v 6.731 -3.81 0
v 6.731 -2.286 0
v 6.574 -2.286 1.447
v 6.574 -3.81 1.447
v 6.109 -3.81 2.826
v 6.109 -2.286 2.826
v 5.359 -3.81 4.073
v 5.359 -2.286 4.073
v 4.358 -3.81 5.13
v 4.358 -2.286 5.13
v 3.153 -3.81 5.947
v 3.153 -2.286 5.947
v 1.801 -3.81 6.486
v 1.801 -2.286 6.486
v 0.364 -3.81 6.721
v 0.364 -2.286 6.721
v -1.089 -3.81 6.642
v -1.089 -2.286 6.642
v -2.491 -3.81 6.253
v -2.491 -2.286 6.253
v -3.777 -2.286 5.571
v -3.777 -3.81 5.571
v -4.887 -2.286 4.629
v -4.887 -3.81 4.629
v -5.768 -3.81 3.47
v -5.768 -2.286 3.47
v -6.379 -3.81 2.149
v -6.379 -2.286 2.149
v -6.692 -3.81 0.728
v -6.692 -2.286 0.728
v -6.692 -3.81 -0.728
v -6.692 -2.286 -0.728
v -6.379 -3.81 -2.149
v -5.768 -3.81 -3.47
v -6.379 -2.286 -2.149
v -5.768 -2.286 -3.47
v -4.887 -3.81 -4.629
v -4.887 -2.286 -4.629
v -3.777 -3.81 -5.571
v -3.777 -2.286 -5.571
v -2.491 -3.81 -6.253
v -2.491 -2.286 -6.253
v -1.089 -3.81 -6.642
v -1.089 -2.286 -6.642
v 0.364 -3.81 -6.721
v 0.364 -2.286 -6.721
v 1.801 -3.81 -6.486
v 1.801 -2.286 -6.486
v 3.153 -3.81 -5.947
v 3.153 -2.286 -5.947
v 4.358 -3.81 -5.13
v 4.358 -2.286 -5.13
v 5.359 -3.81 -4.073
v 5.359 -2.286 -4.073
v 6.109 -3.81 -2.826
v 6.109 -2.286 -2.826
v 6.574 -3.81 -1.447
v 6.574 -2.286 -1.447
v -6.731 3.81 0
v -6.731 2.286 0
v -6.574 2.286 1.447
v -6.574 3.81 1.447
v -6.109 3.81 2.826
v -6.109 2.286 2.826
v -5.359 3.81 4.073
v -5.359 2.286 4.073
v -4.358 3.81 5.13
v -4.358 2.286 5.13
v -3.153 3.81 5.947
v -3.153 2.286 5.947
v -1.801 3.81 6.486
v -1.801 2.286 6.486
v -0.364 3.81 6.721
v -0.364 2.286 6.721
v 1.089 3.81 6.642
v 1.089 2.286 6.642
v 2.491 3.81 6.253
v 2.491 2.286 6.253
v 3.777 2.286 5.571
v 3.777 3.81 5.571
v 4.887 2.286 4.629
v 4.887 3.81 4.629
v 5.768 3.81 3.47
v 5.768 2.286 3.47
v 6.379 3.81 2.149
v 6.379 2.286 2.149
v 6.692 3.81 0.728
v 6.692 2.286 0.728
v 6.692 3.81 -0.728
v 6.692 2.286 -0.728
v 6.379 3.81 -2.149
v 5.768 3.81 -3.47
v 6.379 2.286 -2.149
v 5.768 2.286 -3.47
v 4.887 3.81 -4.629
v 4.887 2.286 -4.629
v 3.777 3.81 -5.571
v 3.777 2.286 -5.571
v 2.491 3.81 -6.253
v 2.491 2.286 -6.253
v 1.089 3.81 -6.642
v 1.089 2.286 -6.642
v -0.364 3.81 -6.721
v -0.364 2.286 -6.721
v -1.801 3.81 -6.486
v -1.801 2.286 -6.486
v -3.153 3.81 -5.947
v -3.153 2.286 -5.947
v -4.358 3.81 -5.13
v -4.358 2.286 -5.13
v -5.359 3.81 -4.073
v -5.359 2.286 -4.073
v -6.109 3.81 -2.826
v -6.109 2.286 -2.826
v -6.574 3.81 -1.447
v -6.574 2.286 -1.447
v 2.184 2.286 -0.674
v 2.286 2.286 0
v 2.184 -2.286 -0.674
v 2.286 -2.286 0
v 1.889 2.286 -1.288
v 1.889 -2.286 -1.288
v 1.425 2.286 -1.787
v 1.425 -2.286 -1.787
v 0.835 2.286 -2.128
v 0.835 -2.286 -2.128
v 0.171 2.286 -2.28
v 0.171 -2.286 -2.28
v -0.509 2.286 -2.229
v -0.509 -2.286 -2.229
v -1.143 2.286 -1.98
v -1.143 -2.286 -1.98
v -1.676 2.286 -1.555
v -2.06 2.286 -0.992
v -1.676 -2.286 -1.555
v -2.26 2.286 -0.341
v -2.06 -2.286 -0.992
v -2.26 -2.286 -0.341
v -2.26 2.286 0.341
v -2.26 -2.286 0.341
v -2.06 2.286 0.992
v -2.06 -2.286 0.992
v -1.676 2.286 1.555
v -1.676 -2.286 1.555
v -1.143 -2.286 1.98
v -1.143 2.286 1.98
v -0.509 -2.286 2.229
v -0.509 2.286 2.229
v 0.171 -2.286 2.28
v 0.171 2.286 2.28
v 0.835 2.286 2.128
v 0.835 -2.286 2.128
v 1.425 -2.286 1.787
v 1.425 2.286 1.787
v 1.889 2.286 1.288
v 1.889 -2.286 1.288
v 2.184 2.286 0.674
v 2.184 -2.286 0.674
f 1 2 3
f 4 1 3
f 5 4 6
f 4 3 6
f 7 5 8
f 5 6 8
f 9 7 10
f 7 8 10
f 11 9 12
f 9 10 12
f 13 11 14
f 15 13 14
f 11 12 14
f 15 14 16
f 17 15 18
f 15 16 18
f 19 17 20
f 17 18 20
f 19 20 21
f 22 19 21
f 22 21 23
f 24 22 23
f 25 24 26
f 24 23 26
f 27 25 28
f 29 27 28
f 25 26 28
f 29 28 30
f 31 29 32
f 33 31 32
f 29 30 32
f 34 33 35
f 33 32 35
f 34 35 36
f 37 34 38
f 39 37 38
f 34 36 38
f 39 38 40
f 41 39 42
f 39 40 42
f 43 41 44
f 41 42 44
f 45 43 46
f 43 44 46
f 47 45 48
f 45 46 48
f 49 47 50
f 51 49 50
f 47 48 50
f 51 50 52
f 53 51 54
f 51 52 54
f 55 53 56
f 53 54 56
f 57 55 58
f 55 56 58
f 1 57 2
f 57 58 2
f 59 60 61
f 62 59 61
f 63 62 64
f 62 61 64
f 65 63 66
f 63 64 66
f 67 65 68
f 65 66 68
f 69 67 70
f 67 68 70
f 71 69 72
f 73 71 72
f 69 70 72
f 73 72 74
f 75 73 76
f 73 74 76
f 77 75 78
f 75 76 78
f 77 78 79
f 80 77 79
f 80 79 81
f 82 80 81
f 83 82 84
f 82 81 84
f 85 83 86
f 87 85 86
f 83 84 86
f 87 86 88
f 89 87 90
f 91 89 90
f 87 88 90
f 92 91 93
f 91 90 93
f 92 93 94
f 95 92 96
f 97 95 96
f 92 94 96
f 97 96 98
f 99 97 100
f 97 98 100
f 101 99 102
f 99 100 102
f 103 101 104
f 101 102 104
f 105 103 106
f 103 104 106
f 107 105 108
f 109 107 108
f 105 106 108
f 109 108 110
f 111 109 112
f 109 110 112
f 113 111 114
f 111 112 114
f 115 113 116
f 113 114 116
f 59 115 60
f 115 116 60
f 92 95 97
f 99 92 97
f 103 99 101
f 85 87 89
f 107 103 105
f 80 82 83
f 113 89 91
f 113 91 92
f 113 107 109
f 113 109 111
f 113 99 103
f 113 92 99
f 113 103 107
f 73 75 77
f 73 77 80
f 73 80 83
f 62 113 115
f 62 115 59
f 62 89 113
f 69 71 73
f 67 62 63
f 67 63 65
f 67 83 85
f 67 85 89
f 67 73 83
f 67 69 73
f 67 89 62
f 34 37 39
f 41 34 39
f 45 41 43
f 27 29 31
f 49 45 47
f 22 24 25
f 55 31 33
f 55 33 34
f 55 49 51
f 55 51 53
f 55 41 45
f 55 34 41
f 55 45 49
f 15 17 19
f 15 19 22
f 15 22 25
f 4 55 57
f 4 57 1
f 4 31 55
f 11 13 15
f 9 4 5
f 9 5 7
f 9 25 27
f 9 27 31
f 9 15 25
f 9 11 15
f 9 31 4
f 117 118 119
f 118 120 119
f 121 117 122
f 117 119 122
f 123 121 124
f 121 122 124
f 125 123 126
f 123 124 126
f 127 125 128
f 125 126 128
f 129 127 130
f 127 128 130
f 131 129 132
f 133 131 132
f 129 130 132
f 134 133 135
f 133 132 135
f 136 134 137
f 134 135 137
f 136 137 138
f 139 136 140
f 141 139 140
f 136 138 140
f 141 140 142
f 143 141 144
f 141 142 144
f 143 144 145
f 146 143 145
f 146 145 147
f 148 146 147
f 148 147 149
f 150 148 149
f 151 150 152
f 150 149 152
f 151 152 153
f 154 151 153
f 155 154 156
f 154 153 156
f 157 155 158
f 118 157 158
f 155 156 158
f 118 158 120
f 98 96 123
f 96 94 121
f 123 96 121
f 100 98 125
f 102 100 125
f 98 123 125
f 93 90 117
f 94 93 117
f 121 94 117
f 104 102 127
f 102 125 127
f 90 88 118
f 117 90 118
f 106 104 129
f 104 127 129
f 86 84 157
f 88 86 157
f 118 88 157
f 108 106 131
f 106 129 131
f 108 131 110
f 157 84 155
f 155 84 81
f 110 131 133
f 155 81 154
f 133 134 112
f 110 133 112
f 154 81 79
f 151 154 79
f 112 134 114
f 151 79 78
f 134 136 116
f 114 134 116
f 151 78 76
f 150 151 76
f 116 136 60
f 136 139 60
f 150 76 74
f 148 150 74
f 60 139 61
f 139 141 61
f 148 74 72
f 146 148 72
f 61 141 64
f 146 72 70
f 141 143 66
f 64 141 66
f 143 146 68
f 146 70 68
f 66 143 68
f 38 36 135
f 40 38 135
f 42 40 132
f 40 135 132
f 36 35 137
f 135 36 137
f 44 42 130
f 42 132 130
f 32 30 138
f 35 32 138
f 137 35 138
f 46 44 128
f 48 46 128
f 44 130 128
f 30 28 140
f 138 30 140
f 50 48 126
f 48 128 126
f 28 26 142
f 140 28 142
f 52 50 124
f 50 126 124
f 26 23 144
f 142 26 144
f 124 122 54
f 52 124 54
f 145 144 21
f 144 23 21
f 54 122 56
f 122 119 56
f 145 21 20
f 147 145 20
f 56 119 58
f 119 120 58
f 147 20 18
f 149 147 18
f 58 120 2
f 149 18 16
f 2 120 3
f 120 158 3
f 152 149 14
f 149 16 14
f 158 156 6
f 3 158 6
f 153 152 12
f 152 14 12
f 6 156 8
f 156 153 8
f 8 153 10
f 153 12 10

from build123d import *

# Parameters (mm, degrees)
F0_R      = 2.286
F1_DEPTH  = 2.286
F1_FACE_R = 2.286
F2_DEPTH  = 2.286
F3_R      = 6.731
F4_DEPTH  = 1.524
F5_R      = 6.731
F6_DEPTH  = 1.524


with BuildPart() as f1:
    # F0 (on Front) → F1 (new body)
    with BuildSketch(Plane.XZ):
        Circle(F0_R)
    extrude(amount=F1_DEPTH)

    # F1_face (on face) → F2 (join)
    with BuildSketch(Plane(origin=(0, 0, 0), x_dir=(1, 0, 0), z_dir=(0, 1, 0))):
        Circle(F1_FACE_R)
    extrude(amount=F2_DEPTH)

    # F3 (on face) → F4 (join)
    with BuildSketch(Plane(origin=(0, 2.286, 0), x_dir=(-1, 0, 0), z_dir=(0, 1, 0))):
        Circle(F3_R)
    extrude(amount=F4_DEPTH)

    # F5 (on face) → F6 (join)
    with BuildSketch(Plane.XZ.offset(2.286)):
        Circle(F5_R)
    extrude(amount=F6_DEPTH)


solid = f1.part
